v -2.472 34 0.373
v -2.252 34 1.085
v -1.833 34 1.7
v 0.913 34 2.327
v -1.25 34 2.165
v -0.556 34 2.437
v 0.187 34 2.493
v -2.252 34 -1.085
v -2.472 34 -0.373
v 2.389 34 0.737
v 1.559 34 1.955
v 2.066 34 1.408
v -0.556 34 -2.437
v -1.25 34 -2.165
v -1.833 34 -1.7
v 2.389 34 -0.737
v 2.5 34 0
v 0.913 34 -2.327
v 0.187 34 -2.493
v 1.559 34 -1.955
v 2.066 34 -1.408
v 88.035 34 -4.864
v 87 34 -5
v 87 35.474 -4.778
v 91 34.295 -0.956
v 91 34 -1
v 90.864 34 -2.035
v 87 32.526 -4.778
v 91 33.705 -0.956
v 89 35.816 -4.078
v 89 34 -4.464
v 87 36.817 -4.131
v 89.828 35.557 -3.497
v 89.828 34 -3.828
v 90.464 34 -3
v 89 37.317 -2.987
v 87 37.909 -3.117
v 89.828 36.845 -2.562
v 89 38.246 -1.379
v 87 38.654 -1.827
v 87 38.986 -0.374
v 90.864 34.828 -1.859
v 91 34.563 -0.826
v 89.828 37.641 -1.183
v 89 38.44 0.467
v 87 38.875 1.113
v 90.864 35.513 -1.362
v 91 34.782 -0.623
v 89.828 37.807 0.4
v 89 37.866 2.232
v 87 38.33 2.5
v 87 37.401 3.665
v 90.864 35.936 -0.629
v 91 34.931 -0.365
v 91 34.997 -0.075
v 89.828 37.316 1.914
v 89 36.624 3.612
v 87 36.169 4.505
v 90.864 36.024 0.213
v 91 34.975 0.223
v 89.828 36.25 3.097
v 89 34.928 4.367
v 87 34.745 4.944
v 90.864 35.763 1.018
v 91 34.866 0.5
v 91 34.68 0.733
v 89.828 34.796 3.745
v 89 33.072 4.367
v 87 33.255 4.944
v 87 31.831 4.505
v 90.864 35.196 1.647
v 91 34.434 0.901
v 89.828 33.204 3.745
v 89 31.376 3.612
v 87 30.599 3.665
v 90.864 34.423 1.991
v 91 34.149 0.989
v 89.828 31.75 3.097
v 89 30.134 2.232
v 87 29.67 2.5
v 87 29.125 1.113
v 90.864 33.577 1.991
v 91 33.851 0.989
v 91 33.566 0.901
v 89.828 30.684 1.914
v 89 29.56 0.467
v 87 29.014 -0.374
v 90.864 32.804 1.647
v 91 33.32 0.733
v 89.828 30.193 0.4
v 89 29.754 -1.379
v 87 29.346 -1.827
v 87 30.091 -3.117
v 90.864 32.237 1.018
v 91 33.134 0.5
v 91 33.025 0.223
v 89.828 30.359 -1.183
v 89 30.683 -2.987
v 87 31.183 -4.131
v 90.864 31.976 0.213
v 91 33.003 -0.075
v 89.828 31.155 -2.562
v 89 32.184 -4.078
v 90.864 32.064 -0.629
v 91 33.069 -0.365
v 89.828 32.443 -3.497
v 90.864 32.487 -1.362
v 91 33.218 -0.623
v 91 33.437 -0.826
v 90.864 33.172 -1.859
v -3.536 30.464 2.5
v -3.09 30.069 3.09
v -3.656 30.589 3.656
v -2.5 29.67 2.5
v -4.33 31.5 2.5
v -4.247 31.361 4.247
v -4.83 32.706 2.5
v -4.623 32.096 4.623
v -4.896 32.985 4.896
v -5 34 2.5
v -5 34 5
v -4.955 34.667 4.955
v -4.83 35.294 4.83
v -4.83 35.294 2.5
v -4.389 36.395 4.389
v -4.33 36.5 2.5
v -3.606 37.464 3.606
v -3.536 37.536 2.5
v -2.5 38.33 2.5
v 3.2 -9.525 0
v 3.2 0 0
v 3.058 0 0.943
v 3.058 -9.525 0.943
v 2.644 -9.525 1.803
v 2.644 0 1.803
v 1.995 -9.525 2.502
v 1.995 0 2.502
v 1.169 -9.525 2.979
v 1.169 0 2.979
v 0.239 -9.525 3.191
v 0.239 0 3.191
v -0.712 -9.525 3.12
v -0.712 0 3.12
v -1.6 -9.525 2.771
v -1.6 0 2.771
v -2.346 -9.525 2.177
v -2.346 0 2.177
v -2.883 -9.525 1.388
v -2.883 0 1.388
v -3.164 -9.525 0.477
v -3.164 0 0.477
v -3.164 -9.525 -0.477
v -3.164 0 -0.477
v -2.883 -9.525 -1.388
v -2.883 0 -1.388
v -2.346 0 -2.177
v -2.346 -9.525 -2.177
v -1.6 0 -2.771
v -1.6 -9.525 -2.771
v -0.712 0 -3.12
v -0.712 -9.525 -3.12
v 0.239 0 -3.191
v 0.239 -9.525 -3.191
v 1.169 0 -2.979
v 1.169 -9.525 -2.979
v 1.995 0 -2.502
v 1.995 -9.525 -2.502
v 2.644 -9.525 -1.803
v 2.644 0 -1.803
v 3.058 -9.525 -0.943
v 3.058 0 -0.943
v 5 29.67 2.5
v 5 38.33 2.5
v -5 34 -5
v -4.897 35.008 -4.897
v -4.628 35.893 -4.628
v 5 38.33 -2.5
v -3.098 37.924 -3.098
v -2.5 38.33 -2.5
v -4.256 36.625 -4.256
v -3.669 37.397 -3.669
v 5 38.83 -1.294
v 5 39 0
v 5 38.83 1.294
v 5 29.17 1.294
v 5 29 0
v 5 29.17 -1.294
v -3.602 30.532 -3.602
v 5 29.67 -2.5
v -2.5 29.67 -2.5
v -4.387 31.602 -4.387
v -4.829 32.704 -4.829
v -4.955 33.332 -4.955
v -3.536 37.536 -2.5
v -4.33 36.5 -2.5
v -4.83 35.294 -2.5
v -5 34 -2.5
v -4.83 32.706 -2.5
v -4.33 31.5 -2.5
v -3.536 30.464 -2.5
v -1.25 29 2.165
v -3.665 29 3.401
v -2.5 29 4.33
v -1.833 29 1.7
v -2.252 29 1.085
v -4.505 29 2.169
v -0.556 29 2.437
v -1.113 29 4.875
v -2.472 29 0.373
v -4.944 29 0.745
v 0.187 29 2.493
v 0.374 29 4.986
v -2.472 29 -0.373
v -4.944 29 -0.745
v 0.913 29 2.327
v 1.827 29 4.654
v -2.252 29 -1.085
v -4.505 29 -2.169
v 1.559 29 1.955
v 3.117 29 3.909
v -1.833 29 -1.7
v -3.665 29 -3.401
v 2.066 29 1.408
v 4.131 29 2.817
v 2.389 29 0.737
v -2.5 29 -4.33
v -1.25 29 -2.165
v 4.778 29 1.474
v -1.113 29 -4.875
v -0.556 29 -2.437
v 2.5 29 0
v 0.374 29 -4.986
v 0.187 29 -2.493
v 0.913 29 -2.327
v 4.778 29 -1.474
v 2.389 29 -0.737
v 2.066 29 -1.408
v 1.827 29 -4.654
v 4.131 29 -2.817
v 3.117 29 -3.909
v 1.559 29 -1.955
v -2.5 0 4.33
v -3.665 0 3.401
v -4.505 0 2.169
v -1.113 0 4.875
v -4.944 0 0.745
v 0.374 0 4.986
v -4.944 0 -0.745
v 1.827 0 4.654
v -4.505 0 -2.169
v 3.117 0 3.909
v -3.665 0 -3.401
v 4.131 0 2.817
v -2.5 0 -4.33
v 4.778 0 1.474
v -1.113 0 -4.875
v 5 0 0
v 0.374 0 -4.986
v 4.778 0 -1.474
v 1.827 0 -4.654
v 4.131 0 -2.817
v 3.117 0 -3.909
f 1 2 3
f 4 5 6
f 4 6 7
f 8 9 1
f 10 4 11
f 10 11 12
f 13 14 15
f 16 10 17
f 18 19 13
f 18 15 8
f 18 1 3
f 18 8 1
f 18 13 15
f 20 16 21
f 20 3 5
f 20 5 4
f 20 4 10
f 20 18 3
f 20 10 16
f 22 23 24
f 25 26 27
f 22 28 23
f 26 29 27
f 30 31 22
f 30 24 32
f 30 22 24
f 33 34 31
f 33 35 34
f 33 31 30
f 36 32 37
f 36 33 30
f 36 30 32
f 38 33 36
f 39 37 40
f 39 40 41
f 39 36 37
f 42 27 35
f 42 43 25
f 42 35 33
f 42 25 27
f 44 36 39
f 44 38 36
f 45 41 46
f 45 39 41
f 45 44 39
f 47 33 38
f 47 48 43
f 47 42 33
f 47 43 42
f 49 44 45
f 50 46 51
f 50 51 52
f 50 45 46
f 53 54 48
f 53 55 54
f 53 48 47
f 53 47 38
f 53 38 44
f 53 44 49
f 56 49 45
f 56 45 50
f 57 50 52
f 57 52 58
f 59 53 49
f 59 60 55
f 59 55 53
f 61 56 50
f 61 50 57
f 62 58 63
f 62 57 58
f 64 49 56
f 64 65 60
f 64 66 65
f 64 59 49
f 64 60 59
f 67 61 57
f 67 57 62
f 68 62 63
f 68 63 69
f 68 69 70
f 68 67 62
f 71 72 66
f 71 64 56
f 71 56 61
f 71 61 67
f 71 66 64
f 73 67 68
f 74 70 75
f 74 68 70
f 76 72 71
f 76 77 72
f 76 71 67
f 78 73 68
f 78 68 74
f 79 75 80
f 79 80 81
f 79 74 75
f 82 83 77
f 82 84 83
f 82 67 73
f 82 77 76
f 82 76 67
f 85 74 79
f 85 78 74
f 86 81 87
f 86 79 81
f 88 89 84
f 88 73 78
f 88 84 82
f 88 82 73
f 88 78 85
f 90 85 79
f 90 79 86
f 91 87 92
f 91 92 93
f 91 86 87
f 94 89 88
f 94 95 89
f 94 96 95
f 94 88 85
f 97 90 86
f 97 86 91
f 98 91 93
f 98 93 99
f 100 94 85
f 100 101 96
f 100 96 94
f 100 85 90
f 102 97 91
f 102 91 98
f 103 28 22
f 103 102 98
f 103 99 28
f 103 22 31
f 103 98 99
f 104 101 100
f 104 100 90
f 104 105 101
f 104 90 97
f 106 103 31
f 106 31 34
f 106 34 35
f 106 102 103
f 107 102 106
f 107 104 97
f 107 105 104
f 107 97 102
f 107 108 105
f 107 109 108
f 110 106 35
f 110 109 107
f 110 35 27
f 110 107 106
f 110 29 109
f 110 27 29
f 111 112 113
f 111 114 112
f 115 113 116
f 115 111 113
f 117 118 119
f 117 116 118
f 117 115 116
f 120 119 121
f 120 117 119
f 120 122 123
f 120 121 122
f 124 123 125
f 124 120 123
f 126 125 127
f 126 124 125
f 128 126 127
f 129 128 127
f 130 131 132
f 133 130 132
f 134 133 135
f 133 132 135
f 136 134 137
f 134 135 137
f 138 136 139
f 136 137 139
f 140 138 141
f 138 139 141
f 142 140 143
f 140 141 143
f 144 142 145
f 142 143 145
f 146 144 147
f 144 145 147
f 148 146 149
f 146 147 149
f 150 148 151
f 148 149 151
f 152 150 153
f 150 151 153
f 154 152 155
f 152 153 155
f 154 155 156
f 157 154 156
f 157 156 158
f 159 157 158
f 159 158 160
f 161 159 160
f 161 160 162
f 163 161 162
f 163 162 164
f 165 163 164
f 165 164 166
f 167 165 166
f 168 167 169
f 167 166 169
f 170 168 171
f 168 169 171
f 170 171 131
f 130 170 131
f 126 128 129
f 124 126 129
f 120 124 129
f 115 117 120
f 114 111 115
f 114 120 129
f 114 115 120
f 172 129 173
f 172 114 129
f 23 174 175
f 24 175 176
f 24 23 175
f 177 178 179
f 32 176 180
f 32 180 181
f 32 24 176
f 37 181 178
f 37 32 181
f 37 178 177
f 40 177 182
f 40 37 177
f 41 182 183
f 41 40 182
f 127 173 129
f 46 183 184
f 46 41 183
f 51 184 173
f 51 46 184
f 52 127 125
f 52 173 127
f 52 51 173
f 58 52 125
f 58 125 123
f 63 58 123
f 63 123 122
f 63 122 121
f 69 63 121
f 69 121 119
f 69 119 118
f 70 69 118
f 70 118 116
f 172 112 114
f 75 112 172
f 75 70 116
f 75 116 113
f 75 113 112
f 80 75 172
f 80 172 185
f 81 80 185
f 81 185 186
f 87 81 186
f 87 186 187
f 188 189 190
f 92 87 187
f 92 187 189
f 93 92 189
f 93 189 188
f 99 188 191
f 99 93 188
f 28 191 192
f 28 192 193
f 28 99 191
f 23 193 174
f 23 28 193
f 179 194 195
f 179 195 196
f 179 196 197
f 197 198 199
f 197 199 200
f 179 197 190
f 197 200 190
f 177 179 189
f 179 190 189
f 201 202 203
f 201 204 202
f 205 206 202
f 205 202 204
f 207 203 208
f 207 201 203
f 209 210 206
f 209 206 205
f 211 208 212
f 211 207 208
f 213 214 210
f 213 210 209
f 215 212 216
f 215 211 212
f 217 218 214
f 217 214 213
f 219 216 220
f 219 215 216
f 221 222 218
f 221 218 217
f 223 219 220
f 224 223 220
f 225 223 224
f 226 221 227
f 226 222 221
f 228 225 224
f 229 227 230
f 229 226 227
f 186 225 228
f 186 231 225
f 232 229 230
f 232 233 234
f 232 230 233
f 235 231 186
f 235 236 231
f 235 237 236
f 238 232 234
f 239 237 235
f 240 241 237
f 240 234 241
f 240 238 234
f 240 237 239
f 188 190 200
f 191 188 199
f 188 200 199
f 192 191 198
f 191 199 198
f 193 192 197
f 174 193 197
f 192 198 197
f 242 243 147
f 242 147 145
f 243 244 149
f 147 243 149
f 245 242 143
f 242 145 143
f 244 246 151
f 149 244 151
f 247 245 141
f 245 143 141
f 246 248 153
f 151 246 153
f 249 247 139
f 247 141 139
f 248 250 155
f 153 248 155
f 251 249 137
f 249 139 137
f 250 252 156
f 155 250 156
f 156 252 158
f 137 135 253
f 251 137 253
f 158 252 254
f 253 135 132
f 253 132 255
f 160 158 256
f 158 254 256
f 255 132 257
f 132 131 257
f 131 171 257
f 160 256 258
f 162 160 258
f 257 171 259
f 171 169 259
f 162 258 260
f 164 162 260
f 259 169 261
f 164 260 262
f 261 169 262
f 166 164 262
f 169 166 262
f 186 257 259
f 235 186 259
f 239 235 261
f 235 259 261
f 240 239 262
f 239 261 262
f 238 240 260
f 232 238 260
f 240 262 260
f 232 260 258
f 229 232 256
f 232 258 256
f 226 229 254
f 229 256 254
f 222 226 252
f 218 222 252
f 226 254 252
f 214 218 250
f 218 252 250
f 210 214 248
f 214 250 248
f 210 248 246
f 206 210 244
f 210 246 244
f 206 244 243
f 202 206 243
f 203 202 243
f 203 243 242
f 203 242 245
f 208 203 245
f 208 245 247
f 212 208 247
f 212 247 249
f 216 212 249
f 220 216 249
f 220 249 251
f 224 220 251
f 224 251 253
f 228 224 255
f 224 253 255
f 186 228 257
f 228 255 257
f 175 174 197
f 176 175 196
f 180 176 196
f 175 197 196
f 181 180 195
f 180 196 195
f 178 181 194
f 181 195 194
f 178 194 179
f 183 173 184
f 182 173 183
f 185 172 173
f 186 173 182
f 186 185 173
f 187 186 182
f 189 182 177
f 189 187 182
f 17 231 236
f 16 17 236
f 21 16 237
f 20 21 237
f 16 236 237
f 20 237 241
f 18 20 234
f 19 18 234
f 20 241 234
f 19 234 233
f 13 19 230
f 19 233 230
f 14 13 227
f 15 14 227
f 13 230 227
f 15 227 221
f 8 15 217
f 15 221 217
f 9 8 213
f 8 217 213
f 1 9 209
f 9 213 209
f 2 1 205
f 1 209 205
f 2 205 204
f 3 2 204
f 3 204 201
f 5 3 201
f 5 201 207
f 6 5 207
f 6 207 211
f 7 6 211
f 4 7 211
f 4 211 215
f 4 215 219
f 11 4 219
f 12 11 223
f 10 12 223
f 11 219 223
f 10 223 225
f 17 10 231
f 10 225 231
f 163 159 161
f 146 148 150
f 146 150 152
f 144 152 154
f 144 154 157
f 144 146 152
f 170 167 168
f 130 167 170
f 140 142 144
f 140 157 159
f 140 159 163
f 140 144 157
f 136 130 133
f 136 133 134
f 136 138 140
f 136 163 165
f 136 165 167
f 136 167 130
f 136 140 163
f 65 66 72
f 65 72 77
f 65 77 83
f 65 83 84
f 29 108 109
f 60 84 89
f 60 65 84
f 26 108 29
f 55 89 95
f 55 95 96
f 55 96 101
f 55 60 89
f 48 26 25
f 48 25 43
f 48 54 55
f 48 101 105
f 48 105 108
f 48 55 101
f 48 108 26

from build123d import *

# Parameters (mm, degrees)
SKETCH1_R                = 5
BOSS_EXTRUDE1_DEPTH      = 29
SKETCH2_R                = 2.5
BOSS_EXTRUDE2_DEPTH      = 5
SKETCH4_R                = 3.2
BOSS_EXTRUDE3_DEPTH      = 9.525
SKETCH5_R                = 5
BOSS_EXTRUDE4_DEPTH      = 86
BOSS_EXTRUDE4_DEPTH_BACK = 10
FILLET1_R                = 4
SKETCH8_W                = 10
SKETCH8_H                = 5
CUT_EXTRUDE2_DEPTH       = 11
CUT_EXTRUDE3_DEPTH       = 6
CUT_EXTRUDE3_DEPTH_BACK  = 6


with BuildPart() as part:
    # Sketch1 → Boss-Extrude1 (new body)
    with BuildSketch(Plane(origin=(0, 0, 0), x_dir=(1, 0, 0), z_dir=(0, 1, 0))):
        Circle(SKETCH1_R)
    extrude(amount=BOSS_EXTRUDE1_DEPTH)

    # Sketch2 → Boss-Extrude2 (add)
    with BuildSketch(Plane(origin=(0, 29, 0), x_dir=(1, 0, 0), z_dir=(0, 1, 0))):
        Circle(SKETCH2_R)
    extrude(amount=BOSS_EXTRUDE2_DEPTH)

    # Sketch4 → Boss-Extrude3 (add)
    with BuildSketch(Plane.XZ):
        Circle(SKETCH4_R)
    extrude(amount=BOSS_EXTRUDE3_DEPTH)


with BuildPart() as body_2:
    # Sketch5 → Boss-Extrude4 (new body, two sides)
    with BuildSketch(Plane(origin=(5, 0, 0), x_dir=(0, 0, -1), z_dir=(1, 0, 0))) as boss_extrude4_sk:
        with Locations((0, 34)):
            Circle(SKETCH5_R)
    extrude(amount=BOSS_EXTRUDE4_DEPTH)
    extrude(boss_extrude4_sk.sketch, amount=-BOSS_EXTRUDE4_DEPTH_BACK)

    # Fillet1
    fillet1_edges = [body_2.edges().sort_by_distance(p)[0] for p in [
        (91, 34, 5),
    ]]
    fillet(fillet1_edges, radius=FILLET1_R)

    # Sketch8 → Cut-Extrude2 (cut, through all)
    with BuildSketch(Plane(origin=(0, 29, 0), x_dir=(1, 0, 0), z_dir=(0, 1, 0))):
        Rectangle(SKETCH8_W, SKETCH8_H)
    extrude(amount=CUT_EXTRUDE2_DEPTH, mode=Mode.SUBTRACT)

    # Sketch9 → Cut-Extrude3 (cut, two sides)
    with BuildSketch(Plane.XY) as cut_extrude3_sk:
        with BuildLine():
            Line((-5, 34), (-5, 29))
            Line((-5, 29), (0, 29))
            ThreePointArc((0, 29), (-3.535533906, 30.464466094), (-5, 34))
        make_face()
        with BuildLine():
            Line((-5, 39), (-5, 34))
            ThreePointArc((-5, 34), (-3.535533906, 37.535533906), (0, 39))
            Line((0, 39), (-5, 39))
        make_face()
    extrude(amount=CUT_EXTRUDE3_DEPTH, mode=Mode.SUBTRACT)
    extrude(cut_extrude3_sk.sketch, amount=-CUT_EXTRUDE3_DEPTH_BACK, mode=Mode.SUBTRACT)


solid = Compound([part.part, body_2.part])
